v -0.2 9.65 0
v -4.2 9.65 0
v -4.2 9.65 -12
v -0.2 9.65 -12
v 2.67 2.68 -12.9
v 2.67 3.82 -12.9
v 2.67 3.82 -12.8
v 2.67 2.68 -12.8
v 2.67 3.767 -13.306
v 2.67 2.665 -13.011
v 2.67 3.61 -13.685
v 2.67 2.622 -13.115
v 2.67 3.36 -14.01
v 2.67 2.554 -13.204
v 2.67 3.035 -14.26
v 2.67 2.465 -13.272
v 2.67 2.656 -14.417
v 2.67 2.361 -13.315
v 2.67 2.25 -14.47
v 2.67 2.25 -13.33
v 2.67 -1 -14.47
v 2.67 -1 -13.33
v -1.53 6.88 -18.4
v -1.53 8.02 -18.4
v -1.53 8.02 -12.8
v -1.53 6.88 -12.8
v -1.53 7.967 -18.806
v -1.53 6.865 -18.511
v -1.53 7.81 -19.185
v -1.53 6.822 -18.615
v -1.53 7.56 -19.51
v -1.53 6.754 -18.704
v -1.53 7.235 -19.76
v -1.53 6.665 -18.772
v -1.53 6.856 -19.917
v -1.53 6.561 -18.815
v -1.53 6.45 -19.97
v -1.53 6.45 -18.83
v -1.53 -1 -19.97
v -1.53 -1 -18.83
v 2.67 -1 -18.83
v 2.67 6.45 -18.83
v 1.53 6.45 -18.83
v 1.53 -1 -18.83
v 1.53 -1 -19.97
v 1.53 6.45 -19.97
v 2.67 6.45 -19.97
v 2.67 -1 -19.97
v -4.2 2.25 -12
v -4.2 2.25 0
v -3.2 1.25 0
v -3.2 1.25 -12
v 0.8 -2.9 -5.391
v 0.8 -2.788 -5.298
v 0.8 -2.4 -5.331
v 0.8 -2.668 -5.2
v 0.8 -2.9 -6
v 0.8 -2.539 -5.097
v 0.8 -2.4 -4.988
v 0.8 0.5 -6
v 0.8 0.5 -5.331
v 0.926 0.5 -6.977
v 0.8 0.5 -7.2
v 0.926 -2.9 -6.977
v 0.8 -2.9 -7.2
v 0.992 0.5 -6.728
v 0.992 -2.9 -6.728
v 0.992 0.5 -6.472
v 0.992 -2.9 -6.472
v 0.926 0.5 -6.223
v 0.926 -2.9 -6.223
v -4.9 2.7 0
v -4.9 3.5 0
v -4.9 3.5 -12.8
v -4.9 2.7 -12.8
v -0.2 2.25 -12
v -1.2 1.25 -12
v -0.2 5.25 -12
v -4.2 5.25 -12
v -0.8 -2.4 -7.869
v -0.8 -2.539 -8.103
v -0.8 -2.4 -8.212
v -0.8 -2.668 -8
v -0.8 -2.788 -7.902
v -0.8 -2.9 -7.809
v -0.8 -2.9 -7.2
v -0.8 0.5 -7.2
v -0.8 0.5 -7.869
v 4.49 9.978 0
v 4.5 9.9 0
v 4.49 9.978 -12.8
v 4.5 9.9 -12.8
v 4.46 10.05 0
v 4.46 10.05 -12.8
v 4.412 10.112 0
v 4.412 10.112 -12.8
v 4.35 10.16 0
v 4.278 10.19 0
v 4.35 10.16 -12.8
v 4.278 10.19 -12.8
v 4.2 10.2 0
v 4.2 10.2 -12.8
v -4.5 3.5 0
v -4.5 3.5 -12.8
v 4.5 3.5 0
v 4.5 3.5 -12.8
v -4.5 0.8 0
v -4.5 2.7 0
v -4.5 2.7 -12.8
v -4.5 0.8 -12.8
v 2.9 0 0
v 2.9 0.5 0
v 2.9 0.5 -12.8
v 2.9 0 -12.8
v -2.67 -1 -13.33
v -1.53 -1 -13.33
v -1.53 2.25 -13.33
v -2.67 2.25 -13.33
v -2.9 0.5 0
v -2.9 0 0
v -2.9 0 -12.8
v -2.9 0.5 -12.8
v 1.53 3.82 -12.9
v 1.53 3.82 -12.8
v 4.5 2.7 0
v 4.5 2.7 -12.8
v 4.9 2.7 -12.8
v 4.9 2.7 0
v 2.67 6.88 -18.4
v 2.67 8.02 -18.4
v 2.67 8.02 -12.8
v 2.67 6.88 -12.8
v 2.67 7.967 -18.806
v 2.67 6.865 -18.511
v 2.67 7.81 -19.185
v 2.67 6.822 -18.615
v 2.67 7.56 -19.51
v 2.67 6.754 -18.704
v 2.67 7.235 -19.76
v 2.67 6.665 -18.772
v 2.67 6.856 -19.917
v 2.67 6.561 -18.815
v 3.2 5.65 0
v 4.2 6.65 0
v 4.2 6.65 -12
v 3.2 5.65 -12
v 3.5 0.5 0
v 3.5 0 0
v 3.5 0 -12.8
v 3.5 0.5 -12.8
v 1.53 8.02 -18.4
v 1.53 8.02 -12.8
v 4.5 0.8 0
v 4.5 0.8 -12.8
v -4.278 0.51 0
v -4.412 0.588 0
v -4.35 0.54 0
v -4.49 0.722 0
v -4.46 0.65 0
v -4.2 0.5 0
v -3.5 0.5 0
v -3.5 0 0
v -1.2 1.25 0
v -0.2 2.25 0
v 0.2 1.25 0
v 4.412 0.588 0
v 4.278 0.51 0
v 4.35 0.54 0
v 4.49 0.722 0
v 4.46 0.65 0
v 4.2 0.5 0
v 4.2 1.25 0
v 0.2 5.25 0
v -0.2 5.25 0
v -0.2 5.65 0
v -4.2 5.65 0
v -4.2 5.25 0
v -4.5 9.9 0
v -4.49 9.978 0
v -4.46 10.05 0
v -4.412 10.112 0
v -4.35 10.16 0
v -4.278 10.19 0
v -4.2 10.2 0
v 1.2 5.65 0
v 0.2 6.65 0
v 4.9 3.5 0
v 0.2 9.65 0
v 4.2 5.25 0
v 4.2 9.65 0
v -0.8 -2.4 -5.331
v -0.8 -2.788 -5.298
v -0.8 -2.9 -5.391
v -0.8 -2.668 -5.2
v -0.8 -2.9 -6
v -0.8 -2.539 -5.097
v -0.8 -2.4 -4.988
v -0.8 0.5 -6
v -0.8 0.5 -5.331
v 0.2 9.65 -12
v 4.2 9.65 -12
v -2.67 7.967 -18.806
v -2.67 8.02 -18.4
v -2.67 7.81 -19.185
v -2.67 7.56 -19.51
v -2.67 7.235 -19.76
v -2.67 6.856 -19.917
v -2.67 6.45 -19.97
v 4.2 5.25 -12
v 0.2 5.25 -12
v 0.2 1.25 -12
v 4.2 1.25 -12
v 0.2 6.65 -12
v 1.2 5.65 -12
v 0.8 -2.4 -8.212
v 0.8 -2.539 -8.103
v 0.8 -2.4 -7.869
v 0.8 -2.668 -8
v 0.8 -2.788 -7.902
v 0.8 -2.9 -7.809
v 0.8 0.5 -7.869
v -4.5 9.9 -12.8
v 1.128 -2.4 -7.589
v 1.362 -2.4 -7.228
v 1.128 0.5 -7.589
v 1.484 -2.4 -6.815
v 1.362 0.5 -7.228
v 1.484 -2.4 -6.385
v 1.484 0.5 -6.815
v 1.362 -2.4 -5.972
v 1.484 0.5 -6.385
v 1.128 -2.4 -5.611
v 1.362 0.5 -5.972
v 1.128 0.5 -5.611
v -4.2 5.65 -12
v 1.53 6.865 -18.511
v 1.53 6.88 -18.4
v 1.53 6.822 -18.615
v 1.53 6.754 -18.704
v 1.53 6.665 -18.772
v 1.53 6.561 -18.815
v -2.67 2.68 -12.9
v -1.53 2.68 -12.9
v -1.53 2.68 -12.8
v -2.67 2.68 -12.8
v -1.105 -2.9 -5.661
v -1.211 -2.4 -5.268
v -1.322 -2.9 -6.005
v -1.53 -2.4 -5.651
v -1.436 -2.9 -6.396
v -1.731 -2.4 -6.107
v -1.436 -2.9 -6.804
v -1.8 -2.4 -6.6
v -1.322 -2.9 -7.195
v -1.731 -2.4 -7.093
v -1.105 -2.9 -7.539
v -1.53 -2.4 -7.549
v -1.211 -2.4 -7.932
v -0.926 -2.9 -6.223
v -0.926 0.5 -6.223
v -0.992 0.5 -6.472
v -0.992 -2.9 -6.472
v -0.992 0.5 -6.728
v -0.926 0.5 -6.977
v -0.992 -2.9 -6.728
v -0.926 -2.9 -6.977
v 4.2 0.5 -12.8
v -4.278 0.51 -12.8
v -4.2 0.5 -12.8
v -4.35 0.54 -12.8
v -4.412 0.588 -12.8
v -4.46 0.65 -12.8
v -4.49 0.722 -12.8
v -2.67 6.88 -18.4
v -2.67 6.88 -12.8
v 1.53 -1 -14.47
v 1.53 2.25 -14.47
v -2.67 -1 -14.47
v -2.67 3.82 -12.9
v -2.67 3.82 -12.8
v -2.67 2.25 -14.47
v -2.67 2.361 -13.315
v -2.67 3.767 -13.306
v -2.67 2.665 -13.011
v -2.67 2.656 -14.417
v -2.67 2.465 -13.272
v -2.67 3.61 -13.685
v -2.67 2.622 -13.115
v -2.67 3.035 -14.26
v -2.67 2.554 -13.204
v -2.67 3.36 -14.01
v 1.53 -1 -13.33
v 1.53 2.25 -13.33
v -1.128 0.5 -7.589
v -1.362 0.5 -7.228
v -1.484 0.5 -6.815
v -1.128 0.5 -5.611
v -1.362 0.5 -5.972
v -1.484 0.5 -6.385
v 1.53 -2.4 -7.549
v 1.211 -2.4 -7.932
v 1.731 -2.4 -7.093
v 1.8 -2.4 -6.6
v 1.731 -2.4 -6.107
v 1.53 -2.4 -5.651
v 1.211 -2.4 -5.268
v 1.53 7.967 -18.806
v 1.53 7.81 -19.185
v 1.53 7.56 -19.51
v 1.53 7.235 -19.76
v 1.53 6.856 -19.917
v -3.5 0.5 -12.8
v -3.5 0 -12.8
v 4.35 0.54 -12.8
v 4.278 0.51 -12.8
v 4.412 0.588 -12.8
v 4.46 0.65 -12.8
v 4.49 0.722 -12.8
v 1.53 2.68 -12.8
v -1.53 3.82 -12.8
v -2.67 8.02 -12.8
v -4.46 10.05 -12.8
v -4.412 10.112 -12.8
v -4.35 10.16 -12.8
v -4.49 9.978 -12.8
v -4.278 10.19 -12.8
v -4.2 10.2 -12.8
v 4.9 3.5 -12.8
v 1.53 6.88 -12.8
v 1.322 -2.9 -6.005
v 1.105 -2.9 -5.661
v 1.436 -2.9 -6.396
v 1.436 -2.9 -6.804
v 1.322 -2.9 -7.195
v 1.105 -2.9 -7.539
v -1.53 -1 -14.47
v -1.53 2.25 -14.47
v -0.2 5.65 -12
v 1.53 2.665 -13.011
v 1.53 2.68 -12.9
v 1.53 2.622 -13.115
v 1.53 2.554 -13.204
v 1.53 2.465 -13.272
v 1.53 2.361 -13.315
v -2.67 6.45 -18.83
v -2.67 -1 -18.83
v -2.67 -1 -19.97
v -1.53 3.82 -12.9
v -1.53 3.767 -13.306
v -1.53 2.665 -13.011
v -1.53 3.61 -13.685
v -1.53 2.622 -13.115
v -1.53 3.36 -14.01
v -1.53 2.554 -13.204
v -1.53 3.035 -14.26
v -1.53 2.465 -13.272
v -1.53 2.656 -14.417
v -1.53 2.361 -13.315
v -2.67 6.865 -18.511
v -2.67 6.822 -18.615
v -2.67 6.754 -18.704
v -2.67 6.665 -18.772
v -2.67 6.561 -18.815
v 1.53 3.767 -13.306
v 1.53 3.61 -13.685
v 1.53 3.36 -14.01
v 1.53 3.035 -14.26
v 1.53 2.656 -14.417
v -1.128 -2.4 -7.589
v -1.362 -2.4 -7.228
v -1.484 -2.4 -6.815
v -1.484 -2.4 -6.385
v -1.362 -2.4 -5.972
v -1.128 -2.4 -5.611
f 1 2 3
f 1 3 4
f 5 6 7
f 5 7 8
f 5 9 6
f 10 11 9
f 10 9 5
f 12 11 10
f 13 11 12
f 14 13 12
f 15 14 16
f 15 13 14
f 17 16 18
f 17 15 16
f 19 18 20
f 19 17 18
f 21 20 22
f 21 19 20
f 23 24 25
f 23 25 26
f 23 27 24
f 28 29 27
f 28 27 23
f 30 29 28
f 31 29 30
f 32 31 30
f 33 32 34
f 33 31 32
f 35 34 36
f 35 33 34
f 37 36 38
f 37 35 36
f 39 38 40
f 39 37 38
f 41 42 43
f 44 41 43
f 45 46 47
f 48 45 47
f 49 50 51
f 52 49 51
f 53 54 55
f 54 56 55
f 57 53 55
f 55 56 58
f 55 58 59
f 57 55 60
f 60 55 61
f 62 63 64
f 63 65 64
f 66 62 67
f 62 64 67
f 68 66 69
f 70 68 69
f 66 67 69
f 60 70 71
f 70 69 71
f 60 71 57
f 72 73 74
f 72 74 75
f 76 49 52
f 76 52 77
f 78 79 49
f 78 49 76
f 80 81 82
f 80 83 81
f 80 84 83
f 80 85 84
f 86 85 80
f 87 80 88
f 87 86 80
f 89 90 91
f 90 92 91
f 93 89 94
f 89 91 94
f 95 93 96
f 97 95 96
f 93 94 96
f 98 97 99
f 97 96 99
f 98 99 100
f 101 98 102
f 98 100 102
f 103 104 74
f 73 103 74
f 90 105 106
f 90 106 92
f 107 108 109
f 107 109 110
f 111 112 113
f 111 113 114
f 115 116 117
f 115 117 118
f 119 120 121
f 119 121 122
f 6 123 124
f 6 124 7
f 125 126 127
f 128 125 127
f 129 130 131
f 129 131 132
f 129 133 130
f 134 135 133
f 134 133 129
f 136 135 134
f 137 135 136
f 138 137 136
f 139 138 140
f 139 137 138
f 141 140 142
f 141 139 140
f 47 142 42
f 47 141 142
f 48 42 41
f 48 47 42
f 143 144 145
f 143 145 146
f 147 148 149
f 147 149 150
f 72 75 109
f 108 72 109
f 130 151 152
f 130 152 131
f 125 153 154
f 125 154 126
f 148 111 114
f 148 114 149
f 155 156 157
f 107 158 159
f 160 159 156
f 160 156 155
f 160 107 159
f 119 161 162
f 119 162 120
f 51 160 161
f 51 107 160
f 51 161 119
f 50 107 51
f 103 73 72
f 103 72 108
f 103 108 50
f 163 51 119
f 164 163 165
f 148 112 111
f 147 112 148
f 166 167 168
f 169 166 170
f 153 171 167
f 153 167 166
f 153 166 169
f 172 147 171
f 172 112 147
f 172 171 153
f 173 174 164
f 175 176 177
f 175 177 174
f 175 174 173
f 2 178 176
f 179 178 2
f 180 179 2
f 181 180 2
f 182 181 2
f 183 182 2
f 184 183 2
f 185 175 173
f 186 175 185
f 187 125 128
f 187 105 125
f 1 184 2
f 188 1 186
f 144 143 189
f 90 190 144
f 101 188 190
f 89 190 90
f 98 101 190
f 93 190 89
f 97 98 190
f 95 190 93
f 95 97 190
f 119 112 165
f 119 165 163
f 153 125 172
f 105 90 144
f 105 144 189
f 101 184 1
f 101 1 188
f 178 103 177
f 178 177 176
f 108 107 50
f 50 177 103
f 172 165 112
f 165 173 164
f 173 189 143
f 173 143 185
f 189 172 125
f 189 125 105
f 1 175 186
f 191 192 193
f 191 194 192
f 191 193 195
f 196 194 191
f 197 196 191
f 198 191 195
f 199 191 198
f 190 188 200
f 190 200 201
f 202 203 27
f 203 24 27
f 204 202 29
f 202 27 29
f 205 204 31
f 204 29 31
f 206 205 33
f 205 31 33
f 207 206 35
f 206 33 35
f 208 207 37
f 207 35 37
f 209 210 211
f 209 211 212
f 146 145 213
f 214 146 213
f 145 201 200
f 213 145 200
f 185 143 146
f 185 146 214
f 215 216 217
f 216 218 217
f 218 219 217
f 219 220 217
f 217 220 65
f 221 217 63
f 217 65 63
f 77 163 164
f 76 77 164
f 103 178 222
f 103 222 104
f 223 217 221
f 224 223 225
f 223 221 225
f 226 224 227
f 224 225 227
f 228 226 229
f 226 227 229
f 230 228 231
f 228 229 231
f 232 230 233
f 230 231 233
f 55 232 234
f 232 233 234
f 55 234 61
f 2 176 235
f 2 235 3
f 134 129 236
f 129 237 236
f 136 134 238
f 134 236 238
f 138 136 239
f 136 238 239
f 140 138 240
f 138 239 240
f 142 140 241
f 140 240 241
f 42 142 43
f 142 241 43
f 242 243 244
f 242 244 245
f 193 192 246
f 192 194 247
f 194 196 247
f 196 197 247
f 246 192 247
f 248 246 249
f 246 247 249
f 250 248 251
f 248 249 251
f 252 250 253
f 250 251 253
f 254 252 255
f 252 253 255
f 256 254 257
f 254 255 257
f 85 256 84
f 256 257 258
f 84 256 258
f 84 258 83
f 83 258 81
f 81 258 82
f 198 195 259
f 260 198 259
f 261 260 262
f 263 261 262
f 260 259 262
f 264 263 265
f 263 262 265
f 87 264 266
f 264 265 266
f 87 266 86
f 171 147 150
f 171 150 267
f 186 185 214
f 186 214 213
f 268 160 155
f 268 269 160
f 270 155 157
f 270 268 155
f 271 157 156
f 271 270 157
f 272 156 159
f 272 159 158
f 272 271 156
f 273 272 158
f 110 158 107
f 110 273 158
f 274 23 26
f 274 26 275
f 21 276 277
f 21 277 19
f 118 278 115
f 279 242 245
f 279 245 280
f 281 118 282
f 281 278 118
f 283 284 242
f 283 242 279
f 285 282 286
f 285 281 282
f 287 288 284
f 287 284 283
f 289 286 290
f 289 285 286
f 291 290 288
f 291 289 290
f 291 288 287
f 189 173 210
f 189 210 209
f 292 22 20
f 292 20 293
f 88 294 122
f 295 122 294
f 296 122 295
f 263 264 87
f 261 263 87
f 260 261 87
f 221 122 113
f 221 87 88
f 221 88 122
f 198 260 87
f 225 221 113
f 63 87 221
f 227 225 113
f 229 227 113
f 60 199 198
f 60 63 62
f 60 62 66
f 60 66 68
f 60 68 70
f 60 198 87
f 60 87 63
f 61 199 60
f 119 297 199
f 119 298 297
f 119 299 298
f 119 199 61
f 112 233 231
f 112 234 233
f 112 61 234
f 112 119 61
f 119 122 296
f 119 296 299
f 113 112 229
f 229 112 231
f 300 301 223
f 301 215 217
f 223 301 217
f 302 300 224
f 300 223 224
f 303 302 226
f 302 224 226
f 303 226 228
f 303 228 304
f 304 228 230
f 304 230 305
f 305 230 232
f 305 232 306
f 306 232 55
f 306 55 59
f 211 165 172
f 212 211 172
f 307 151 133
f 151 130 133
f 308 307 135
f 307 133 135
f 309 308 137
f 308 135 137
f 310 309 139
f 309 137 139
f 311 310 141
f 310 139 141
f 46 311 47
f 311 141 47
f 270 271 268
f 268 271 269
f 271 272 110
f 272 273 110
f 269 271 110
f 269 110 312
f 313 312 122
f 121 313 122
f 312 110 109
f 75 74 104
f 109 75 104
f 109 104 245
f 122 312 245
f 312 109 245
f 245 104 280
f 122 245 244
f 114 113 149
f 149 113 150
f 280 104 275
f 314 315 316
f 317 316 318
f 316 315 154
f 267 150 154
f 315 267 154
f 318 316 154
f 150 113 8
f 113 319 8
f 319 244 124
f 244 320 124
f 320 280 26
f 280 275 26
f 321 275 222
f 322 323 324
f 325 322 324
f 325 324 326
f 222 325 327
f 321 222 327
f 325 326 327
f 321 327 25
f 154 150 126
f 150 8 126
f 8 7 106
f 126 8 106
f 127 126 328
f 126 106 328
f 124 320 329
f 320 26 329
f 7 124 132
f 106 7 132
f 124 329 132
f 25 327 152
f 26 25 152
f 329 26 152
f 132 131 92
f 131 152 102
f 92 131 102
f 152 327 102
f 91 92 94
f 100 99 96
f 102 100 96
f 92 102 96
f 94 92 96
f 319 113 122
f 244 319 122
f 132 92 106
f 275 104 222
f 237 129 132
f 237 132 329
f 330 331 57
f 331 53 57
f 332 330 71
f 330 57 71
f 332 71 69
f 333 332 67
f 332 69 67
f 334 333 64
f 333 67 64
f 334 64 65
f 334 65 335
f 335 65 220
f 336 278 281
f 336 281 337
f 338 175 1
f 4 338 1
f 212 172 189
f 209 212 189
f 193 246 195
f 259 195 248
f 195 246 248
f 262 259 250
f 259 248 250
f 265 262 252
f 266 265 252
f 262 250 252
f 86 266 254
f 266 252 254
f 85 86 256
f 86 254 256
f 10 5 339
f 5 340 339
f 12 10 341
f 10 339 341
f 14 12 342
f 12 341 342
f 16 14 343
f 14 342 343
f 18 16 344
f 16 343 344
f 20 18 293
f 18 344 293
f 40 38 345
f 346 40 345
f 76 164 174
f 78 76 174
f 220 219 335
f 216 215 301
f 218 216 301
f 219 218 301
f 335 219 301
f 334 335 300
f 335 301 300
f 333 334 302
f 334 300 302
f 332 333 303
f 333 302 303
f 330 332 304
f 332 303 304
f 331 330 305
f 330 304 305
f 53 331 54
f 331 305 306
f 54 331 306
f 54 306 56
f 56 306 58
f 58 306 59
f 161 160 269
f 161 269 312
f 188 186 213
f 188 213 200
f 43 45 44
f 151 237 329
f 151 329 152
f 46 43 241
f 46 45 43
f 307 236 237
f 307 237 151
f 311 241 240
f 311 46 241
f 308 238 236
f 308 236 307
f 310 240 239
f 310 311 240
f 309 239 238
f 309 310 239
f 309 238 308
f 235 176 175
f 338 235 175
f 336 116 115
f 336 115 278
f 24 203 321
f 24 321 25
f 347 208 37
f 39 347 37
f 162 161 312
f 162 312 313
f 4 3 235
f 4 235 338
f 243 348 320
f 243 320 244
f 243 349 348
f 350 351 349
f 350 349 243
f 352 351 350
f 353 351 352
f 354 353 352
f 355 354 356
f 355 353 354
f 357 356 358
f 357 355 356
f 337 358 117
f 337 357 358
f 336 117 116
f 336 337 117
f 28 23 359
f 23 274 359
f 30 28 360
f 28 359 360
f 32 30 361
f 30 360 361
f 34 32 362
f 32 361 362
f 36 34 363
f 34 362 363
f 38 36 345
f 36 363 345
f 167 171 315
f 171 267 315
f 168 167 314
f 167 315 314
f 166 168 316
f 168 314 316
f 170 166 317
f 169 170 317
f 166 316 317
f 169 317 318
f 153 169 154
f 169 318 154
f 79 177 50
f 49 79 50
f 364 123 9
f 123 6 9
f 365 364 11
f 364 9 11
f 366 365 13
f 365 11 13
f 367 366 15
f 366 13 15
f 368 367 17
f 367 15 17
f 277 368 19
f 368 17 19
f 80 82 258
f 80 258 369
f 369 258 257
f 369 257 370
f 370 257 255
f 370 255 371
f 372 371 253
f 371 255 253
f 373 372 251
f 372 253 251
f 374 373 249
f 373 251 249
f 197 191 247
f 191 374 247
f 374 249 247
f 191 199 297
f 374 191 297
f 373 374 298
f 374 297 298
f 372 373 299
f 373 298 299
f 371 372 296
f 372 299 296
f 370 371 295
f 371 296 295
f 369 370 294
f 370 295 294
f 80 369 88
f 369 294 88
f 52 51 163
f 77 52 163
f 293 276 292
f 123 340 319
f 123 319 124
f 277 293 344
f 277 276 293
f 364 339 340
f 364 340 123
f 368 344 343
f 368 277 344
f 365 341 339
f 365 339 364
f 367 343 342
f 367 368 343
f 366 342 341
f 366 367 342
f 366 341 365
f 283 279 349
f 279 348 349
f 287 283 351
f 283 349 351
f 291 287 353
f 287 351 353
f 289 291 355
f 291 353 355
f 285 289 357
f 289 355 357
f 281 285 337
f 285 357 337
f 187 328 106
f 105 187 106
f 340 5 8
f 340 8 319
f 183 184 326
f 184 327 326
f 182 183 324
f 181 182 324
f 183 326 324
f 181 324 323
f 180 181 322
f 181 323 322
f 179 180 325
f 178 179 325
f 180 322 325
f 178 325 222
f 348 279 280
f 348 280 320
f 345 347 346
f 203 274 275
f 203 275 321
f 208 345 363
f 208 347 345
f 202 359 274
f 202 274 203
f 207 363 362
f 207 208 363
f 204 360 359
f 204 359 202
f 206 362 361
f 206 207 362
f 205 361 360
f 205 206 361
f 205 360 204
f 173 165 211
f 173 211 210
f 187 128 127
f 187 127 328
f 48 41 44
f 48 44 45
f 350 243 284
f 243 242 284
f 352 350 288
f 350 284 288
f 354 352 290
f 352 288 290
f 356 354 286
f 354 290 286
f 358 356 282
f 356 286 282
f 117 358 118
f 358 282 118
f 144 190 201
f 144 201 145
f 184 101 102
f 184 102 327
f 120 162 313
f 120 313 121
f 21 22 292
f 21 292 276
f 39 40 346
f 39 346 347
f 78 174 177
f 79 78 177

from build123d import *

# Parameters (mm, degrees)
BOSS_EXTRUDE1_DEPTH = 12.8
SKETCH2_W           = 1.14
SKETCH2_H           = 1.14
SKETCH4_W           = 1.14
SKETCH4_H           = 1.14
LPATTERN2_COUNT     = 2
LPATTERN2_PITCH     = 4.2
LPATTERN3_COUNT     = 2
LPATTERN3_PITCH     = 4.2
FILLET1_R           = 0.3
SKETCH6_W           = 4
SKETCH6_H           = 4
CUT_EXTRUDE1_DEPTH  = 12
SKETCH9_W           = 1.6
SKETCH9_H           = 3.5
CUT_EXTRUDE2_DEPTH  = 20.97


with BuildPart() as part:
    # Sketch1 → Boss-Extrude1 (new body)
    with BuildSketch(Plane.XY):
        Polygon((-4.5, 0.5), (-3.5, 0.5), (-3.5, 0), (-2.9, 0), (-2.9, 0.5), (2.9, 0.5), (2.9, 0), (3.5, 0), (3.5, 0.5), (4.5, 0.5), (4.5, 2.7), (4.9, 2.7), (4.9, 3.5), (4.5, 3.5), (4.5, 10.2), (-4.5, 10.2), (-4.5, 3.5), (-4.9, 3.5), (-4.9, 2.7), (-4.5, 2.7), align=None)
    extrude(amount=-BOSS_EXTRUDE1_DEPTH)

    # Sweep2: sweep along a path in Sketch3
    with BuildLine(Plane(origin=(2.1, 0, 0), x_dir=(0, 0, -1), z_dir=(1, 0, 0))) as sweep2_path:
        Line((12.8, 7.45), (18.4, 7.45))
        ThreePointArc((18.4, 7.45), (19.107106781, 7.157106781), (19.4, 6.45))
        Line((19.4, 6.45), (19.4, -1))
    # Sketch2 → Sweep2 (sweep)
    with BuildSketch(Plane(origin=(0, 0, -12.8), x_dir=(-1, 0, 0), z_dir=(0, 0, -1))):
        with Locations((-2.1, 7.45)):
            Rectangle(SKETCH2_W, SKETCH2_H)
    sweep2 = sweep(path=sweep2_path.line)

    # Sweep3: sweep along a path in Sketch5
    with BuildLine(Plane(origin=(2.1, 0, 0), x_dir=(0, 0, -1), z_dir=(1, 0, 0))) as sweep3_path:
        Line((12.8, 3.25), (12.9, 3.25))
        ThreePointArc((12.9, 3.25), (13.607106781, 2.957106781), (13.9, 2.25))
        Line((13.9, 2.25), (13.9, -1))
    # Sketch4 → Sweep3 (sweep)
    with BuildSketch(Plane(origin=(0, 0, -12.8), x_dir=(-1, 0, 0), z_dir=(0, 0, -1))):
        with Locations((-2.1, 3.25)):
            Rectangle(SKETCH4_W, SKETCH4_H)
    sweep3 = sweep(path=sweep3_path.line)

    # LPattern2: Sweep2 ×2
    with Locations(*[(-i * LPATTERN2_PITCH, 0, 0) for i in range(1, LPATTERN2_COUNT)]):
        add(sweep2)

    # LPattern3: Sweep3 ×2
    with Locations(*[(-i * LPATTERN3_PITCH, 0, 0) for i in range(1, LPATTERN3_COUNT)]):
        add(sweep3)

    # Fillet1
    fillet1_edges = [part.edges().sort_by_distance(p)[0] for p in [
        (-4.5, 10.2, -6.4),
        (4.5, 10.2, -6.4),
        (4.5, 0.5, -6.4),
        (-4.5, 0.5, -6.4),
    ]]
    fillet(fillet1_edges, radius=FILLET1_R)

    # Sketch6 → Cut-Extrude1 (cut)
    with BuildSketch(Plane.XY):
        Polygon((-4.2, 2.25), (-3.2, 1.25), (-1.2, 1.25), (-0.2, 2.25), (-0.2, 5.25), (-4.2, 5.25), align=None)
        with Locations((-2.2, 7.65)):
            Rectangle(SKETCH6_W, SKETCH6_H)
        with Locations((2.2, 3.25)):
            Rectangle(SKETCH6_W, SKETCH6_H)
        Polygon((0.2, 9.65), (4.2, 9.65), (4.2, 6.65), (3.2, 5.65), (1.2, 5.65), (0.2, 6.65), align=None)
    extrude(amount=-CUT_EXTRUDE1_DEPTH, mode=Mode.SUBTRACT)

    # Sketch8 → Revolve1 (revolve)
    with BuildSketch(Plane(origin=(0, 0, 0), x_dir=(0, 0, -1), z_dir=(1, 0, 0))):
        Polygon((5.6, 0.5), (5.6, -2.9), (5.150103769, -2.9), (4.8, -2.4), (5.1, -2.4), (5.1, 0.5), align=None)
    revolve(axis=Axis((0, 0.5, -6.6), (0, -1, 0)))

    # Sketch9 → Cut-Extrude2 (cut, through all)
    with BuildSketch(Plane.XY):
        with Locations((0, -1.25)):
            Rectangle(SKETCH9_W, SKETCH9_H)
    extrude(amount=-CUT_EXTRUDE2_DEPTH, mode=Mode.SUBTRACT)


solid = part.part
